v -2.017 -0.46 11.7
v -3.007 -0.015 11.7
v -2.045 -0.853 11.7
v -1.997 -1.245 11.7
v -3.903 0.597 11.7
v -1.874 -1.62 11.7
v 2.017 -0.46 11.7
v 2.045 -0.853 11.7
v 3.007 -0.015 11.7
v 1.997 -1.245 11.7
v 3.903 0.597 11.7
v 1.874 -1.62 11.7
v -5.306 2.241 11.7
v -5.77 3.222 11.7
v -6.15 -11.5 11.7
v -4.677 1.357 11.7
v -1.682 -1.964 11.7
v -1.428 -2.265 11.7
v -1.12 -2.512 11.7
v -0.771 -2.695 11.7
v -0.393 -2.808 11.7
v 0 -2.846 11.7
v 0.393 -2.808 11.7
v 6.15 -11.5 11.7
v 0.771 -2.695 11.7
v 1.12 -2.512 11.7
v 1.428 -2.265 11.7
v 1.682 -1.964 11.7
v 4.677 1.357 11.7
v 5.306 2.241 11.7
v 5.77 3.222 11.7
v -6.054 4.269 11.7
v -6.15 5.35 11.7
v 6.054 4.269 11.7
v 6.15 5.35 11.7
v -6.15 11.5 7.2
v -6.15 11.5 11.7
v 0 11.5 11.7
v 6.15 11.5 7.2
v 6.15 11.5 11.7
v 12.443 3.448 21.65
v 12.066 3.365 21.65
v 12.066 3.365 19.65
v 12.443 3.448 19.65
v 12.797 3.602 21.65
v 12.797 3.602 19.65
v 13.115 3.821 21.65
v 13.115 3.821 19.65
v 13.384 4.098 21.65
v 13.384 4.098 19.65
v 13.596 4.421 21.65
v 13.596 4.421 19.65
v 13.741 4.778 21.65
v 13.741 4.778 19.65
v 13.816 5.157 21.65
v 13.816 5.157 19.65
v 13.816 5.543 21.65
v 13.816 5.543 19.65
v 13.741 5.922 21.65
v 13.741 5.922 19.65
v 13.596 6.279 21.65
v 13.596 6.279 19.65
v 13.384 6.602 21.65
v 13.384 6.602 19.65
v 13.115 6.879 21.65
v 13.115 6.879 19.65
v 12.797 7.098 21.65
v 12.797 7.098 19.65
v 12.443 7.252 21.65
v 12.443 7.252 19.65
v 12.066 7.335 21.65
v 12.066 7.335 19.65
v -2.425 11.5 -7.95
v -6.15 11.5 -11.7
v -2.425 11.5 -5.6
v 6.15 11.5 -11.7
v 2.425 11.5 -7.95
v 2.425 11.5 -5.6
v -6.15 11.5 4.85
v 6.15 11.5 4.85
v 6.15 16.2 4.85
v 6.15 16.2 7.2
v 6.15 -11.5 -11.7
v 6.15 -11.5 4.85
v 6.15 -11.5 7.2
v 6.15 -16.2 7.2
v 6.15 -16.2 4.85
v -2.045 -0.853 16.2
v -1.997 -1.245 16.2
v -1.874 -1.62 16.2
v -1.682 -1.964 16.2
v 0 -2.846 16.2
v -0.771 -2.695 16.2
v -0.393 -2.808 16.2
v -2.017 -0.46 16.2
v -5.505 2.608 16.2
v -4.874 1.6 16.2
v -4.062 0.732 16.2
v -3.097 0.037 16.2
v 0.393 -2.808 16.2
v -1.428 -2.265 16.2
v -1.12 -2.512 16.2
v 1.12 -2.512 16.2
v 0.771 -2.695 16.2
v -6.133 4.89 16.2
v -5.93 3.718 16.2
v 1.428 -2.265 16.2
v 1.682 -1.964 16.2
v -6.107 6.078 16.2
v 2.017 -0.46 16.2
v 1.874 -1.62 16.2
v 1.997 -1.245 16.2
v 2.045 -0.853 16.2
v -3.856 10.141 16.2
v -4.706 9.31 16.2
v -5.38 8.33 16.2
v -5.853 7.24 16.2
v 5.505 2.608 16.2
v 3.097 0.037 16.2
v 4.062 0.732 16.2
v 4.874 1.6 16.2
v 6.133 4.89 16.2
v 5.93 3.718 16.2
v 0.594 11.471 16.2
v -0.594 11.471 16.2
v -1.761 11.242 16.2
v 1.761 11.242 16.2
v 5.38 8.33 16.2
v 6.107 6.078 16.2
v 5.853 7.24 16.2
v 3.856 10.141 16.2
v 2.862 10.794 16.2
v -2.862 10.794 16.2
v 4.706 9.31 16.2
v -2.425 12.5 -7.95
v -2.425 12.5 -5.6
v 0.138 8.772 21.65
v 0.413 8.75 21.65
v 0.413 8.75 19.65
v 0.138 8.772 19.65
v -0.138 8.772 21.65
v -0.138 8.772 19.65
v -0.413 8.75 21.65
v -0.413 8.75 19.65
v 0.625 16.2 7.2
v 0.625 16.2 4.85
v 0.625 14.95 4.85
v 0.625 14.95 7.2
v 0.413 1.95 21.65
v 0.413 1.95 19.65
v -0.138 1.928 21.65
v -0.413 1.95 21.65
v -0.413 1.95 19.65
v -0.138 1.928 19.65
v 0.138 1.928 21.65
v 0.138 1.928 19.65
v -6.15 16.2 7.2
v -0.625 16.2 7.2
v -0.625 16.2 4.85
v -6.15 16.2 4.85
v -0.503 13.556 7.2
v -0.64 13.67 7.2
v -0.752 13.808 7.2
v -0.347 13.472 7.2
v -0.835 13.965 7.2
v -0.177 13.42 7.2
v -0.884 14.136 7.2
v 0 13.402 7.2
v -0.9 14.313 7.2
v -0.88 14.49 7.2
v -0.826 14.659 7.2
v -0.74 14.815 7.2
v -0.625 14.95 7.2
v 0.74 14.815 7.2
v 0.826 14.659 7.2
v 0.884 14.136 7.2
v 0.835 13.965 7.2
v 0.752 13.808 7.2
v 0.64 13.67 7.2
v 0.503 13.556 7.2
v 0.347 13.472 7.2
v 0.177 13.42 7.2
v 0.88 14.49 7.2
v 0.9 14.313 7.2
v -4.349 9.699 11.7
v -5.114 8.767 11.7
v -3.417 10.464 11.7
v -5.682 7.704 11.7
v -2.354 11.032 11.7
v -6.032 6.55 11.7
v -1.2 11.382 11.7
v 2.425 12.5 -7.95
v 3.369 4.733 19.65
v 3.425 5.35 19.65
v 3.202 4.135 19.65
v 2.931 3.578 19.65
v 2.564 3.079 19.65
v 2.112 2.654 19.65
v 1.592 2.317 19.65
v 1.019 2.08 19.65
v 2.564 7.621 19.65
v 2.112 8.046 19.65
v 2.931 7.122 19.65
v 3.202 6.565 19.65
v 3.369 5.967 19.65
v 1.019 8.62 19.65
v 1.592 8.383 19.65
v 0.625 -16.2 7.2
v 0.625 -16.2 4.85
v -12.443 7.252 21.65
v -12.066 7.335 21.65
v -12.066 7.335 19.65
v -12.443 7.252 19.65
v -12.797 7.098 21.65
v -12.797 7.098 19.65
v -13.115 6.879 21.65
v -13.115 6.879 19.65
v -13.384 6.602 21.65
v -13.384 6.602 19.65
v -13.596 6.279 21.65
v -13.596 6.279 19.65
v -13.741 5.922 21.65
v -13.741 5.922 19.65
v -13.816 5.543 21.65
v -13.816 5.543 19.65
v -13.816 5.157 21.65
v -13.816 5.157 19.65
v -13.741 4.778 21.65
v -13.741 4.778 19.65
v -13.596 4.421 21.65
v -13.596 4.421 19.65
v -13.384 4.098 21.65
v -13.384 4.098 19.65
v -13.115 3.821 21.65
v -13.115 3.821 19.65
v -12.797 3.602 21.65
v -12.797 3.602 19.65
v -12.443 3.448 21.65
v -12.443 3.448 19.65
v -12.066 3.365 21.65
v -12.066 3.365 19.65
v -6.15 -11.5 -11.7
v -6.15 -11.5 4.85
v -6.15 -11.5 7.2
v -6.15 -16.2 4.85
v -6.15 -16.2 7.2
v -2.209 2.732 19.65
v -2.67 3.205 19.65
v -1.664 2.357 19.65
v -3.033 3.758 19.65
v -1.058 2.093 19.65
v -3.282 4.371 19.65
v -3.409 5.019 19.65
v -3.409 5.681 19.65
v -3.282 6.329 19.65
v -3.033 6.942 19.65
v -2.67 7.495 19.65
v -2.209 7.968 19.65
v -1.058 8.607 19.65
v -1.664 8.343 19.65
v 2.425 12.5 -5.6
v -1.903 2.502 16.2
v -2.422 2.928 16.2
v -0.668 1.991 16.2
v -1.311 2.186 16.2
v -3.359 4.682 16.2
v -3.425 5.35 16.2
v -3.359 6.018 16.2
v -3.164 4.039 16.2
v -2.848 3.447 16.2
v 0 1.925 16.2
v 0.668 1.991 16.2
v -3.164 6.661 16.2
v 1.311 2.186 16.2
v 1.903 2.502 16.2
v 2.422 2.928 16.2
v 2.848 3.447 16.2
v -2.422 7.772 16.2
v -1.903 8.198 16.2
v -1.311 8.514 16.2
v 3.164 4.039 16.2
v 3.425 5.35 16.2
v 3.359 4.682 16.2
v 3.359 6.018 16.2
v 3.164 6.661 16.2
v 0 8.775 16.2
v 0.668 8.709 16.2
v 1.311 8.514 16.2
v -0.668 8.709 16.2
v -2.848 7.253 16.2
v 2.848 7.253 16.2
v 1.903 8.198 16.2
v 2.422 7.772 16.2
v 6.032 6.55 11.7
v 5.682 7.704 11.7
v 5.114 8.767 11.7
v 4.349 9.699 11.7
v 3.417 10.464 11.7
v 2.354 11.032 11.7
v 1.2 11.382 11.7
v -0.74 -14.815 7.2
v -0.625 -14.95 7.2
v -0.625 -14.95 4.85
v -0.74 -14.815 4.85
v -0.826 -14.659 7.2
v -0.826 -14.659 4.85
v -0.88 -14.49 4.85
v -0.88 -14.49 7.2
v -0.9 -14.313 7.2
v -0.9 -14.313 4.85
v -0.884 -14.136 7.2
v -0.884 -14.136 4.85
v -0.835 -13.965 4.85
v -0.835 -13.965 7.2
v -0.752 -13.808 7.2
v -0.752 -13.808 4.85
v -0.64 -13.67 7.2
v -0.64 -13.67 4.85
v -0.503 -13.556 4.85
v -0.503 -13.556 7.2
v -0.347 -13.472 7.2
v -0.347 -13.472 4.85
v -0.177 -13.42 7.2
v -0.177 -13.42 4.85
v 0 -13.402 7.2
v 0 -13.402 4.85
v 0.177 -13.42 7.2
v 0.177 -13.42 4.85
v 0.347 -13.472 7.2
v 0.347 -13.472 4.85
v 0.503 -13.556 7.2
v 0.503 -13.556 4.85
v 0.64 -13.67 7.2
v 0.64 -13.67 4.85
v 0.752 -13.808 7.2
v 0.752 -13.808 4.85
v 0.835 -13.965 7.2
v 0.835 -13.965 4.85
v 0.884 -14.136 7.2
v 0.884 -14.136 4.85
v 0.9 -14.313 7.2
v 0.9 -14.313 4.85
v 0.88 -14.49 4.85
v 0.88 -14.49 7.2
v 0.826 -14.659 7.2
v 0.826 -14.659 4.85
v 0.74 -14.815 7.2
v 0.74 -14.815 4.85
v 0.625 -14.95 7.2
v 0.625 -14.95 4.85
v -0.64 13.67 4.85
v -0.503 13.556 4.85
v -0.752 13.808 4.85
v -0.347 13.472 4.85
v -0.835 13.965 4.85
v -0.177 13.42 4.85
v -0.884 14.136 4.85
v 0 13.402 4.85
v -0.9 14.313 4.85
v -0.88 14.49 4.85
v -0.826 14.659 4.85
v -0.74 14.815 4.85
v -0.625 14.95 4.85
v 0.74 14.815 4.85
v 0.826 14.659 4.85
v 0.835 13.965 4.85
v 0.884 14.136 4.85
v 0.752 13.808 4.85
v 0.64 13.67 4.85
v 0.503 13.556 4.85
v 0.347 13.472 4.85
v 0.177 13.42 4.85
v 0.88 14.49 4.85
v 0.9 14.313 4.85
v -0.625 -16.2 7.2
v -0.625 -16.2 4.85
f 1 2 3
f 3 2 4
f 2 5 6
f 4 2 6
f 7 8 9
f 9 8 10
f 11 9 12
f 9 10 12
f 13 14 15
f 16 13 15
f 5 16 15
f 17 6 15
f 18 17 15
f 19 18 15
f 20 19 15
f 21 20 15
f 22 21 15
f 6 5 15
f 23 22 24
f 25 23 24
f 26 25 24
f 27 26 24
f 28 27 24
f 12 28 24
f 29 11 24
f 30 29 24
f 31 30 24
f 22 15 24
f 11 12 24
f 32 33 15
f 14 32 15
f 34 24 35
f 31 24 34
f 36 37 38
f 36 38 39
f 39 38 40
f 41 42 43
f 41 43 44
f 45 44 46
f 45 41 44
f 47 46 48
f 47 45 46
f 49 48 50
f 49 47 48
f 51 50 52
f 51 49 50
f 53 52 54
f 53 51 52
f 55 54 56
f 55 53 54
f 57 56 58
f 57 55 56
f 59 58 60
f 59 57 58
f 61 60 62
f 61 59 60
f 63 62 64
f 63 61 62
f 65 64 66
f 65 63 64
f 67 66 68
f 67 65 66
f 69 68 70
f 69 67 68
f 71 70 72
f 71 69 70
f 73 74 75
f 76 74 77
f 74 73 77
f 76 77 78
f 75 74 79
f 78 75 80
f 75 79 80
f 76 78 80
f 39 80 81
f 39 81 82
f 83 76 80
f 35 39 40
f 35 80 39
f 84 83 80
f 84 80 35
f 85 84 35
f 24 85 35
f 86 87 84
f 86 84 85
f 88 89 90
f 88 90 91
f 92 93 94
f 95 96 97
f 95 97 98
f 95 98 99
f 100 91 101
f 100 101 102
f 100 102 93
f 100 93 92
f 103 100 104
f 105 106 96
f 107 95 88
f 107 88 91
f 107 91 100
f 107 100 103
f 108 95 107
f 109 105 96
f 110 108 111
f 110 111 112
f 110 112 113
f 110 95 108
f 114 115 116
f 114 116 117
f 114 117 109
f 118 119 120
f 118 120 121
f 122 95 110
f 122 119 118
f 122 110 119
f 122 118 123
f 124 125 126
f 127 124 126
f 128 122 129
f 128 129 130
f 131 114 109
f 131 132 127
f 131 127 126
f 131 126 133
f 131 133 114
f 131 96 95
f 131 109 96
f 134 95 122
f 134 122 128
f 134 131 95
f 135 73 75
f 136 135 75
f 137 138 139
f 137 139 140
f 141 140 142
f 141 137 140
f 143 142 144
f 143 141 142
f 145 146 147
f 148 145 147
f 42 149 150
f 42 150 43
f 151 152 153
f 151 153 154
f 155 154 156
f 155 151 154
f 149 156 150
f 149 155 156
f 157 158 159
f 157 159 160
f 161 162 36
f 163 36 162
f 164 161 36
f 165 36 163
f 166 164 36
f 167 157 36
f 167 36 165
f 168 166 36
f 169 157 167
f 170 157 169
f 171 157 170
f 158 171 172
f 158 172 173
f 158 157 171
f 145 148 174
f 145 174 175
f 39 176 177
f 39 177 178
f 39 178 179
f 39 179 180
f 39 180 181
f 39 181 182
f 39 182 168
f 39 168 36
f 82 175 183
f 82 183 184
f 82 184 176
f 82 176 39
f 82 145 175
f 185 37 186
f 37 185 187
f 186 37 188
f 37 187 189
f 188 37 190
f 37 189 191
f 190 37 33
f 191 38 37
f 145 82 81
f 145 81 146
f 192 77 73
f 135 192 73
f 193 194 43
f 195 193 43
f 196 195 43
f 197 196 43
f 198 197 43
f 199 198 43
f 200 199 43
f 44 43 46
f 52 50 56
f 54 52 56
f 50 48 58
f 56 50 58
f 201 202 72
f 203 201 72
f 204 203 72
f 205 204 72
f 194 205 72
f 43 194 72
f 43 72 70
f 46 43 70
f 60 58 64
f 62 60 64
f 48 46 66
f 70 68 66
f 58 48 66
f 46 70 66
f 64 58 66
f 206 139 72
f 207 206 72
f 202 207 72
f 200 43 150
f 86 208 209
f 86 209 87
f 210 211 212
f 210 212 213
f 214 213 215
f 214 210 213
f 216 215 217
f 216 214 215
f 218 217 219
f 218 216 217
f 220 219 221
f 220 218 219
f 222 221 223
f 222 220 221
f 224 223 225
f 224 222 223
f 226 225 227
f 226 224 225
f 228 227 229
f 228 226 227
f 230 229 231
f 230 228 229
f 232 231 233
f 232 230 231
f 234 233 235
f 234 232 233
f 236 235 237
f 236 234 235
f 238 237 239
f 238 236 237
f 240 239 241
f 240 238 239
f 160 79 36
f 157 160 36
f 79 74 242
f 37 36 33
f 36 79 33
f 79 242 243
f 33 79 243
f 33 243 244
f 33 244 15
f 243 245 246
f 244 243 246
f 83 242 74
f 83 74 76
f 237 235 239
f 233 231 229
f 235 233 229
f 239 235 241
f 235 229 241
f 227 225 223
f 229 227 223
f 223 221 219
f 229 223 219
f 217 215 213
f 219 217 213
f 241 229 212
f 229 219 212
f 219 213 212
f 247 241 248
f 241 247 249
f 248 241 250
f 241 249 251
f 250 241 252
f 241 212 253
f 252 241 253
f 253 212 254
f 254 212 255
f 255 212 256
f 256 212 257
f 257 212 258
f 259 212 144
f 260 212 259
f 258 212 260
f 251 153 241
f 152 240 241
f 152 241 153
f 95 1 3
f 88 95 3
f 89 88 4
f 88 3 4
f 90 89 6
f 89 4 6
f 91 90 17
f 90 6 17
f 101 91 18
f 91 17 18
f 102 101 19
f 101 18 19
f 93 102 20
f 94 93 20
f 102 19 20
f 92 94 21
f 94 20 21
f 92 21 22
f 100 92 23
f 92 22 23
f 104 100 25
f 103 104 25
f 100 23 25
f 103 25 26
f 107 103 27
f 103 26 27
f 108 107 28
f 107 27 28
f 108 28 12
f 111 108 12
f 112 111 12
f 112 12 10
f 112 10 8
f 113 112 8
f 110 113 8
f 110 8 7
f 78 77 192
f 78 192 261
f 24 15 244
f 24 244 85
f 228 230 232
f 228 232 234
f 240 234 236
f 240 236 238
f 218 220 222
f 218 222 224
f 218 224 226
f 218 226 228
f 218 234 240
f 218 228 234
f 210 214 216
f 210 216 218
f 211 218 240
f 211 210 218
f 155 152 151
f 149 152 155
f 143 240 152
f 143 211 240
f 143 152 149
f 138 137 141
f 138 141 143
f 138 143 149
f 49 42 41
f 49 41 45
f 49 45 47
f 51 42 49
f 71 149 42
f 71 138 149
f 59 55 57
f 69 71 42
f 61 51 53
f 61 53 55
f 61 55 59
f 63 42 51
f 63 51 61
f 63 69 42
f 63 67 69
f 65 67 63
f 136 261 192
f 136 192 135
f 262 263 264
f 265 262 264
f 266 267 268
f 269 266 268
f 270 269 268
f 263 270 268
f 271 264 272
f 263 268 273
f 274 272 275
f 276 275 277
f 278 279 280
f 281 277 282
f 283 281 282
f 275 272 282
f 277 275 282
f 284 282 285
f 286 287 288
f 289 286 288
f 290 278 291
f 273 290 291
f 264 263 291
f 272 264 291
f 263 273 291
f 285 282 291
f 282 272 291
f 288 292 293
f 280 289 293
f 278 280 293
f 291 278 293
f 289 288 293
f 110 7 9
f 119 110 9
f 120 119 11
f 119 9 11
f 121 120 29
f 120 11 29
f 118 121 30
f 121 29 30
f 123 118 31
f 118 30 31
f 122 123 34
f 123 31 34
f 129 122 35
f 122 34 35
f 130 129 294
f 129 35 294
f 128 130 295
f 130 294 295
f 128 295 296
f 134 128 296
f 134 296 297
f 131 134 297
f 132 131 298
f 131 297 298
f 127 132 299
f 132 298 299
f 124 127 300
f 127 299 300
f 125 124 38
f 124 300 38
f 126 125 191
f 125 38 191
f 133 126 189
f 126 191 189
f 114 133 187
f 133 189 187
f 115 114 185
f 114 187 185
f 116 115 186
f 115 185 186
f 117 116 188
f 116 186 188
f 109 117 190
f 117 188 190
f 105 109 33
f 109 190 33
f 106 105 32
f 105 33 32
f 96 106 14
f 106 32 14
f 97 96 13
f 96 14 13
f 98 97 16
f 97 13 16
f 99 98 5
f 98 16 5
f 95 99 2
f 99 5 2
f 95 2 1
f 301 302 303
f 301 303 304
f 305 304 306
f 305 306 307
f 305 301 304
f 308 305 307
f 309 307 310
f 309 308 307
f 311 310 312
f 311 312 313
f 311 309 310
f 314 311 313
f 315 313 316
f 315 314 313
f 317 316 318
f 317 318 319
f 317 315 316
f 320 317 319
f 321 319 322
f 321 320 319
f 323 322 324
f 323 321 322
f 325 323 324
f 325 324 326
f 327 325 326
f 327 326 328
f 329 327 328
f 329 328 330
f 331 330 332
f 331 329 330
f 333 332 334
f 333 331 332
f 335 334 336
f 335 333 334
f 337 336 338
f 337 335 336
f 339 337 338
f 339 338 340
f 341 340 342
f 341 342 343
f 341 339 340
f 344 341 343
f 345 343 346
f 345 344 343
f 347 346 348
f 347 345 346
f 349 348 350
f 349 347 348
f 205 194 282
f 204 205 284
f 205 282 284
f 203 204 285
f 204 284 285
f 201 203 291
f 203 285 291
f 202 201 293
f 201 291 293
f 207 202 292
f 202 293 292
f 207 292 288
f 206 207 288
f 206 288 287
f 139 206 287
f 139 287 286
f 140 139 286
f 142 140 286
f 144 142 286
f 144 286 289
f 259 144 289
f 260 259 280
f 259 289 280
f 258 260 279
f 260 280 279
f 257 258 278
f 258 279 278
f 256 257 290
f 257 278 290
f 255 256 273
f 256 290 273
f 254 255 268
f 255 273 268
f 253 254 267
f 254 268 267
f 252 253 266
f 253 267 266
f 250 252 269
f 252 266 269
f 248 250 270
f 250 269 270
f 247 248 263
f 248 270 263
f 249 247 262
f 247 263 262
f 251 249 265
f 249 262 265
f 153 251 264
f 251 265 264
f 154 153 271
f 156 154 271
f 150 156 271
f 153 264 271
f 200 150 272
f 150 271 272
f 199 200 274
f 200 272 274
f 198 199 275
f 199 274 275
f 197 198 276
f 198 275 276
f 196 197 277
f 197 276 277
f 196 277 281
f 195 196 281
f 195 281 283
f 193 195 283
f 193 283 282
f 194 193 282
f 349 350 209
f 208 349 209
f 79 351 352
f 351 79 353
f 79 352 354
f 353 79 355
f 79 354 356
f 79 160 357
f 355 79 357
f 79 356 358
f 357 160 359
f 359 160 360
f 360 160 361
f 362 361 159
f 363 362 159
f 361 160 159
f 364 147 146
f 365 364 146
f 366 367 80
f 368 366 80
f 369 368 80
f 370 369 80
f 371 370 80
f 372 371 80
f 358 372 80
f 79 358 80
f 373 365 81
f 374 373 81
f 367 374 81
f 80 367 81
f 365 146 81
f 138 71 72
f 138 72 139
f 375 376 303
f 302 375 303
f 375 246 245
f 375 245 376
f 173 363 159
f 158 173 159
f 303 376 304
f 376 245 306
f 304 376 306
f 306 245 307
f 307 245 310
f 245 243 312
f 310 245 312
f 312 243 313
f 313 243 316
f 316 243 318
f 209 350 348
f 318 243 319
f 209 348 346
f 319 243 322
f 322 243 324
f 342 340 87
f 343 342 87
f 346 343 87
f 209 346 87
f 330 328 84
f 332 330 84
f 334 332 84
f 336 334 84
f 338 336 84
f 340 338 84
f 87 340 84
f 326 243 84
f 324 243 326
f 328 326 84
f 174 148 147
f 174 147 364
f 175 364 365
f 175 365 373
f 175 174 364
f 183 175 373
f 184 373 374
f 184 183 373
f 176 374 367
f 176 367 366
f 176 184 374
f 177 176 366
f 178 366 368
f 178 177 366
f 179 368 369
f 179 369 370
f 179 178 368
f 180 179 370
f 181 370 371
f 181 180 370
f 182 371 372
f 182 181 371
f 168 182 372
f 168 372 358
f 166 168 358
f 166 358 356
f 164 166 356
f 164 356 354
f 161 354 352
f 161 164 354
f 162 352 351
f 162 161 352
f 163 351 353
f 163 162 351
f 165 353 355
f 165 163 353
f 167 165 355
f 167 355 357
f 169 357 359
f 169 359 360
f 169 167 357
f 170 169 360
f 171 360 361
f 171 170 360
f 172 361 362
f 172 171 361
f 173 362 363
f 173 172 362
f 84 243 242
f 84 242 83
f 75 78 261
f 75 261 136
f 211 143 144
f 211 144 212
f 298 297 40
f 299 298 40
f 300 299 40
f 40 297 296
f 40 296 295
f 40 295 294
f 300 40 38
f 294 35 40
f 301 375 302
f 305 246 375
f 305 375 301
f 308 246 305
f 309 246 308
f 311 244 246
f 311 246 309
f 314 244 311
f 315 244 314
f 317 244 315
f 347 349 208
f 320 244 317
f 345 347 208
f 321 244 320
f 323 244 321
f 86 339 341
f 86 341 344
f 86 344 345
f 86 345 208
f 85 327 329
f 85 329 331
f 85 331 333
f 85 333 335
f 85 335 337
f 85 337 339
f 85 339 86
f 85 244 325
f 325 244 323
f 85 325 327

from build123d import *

# Parameters (mm, degrees)
F0_W      = 12.3
F0_H      = 23.4
F1_DEPTH  = 11.5
F4_DEPTH  = 2.35
F5_W      = 4.85
F5_H      = 2.35
F6_DEPTH  = 1
F8_DEPTH  = 4.5
F9_R      = 3.425
F10_DEPTH = 5.45
F12_DEPTH = 2


with BuildPart() as f1:
    # F0 (on Front) → F1 (new body, symmetric)
    with BuildSketch(Plane.XZ):
        Rectangle(F0_W, F0_H)
    extrude(amount=F1_DEPTH, both=True)

    # F3 (on offset) → F4 (join)
    with BuildSketch(Plane.XY.offset(7.2)):
        with BuildLine():
            Line((-6.15, -11.5), (-6.15, -16.2))
            Line((-6.15, -16.2), (-0.625, -16.2))
            Line((-0.625, -16.2), (-0.625, -14.95))
            ThreePointArc((-0.625, -14.95), (0, -13.402408), (0.625, -14.95))
            Line((0.625, -14.95), (0.625, -16.2))
            Line((0.625, -16.2), (6.15, -16.2))
            Line((6.15, -16.2), (6.15, -11.5))
            Line((6.15, -11.5), (-6.15, -11.5))
        make_face()
        with BuildLine():
            ThreePointArc((0.625, 14.95), (0, 13.402408), (-0.625, 14.95))
            Line((-0.625, 14.95), (-0.625, 16.2))
            Line((-0.625, 16.2), (-6.15, 16.2))
            Line((-6.15, 16.2), (-6.15, 11.5))
            Line((-6.15, 11.5), (6.15, 11.5))
            Line((6.15, 11.5), (6.15, 16.2))
            Line((6.15, 16.2), (0.625, 16.2))
            Line((0.625, 16.2), (0.625, 14.95))
        make_face()
    extrude(amount=-F4_DEPTH)

    # F5 (on face) → F6 (join)
    with BuildSketch(Plane(origin=(0, 11.5, 0), x_dir=(-1, 0, 0), z_dir=(0, 1, 0))):
        with Locations((0, -6.775)):
            Rectangle(F5_W, F5_H)
    extrude(amount=F6_DEPTH)

    # F7 (on face) → F8 (join)
    with BuildSketch(Plane.XY.offset(11.7)):
        with BuildLine():
            ThreePointArc((-2.017188, -0.459772), (0, -2.845679), (2.017188, -0.459772))
            ThreePointArc((2.017188, -0.459772), (0, 11.5), (-2.017188, -0.459772))
        make_face()
    extrude(amount=F8_DEPTH)


with BuildPart() as f10:
    # F9 (on face) → F10 (new body)
    with BuildSketch(Plane.XY.offset(16.2)):
        with Locations((0, 5.35)):
            Circle(F9_R)
    extrude(amount=F10_DEPTH)

    # F11 (on face) → F12 (join)
    with BuildSketch(Plane.XY.offset(21.65)):
        with BuildLine():
            Line((-0.412738, 8.75004), (-12.066015, 7.335425))
            ThreePointArc((-12.066015, 7.335425), (-13.825, 5.35), (-12.066015, 3.364575))
            Line((-12.066015, 3.364575), (-0.412738, 1.94996))
            ThreePointArc((-0.412738, 1.94996), (0, 1.925), (0.412738, 1.94996))
            Line((0.412738, 1.94996), (12.066015, 3.364575))
            ThreePointArc((12.066015, 3.364575), (13.825, 5.35), (12.066015, 7.335425))
            Line((12.066015, 7.335425), (0.412738, 8.75004))
            ThreePointArc((0.412738, 8.75004), (0, 8.775), (-0.412738, 8.75004))
        make_face()
    extrude(amount=-F12_DEPTH)


solid = Compound([f1.part, f10.part])
